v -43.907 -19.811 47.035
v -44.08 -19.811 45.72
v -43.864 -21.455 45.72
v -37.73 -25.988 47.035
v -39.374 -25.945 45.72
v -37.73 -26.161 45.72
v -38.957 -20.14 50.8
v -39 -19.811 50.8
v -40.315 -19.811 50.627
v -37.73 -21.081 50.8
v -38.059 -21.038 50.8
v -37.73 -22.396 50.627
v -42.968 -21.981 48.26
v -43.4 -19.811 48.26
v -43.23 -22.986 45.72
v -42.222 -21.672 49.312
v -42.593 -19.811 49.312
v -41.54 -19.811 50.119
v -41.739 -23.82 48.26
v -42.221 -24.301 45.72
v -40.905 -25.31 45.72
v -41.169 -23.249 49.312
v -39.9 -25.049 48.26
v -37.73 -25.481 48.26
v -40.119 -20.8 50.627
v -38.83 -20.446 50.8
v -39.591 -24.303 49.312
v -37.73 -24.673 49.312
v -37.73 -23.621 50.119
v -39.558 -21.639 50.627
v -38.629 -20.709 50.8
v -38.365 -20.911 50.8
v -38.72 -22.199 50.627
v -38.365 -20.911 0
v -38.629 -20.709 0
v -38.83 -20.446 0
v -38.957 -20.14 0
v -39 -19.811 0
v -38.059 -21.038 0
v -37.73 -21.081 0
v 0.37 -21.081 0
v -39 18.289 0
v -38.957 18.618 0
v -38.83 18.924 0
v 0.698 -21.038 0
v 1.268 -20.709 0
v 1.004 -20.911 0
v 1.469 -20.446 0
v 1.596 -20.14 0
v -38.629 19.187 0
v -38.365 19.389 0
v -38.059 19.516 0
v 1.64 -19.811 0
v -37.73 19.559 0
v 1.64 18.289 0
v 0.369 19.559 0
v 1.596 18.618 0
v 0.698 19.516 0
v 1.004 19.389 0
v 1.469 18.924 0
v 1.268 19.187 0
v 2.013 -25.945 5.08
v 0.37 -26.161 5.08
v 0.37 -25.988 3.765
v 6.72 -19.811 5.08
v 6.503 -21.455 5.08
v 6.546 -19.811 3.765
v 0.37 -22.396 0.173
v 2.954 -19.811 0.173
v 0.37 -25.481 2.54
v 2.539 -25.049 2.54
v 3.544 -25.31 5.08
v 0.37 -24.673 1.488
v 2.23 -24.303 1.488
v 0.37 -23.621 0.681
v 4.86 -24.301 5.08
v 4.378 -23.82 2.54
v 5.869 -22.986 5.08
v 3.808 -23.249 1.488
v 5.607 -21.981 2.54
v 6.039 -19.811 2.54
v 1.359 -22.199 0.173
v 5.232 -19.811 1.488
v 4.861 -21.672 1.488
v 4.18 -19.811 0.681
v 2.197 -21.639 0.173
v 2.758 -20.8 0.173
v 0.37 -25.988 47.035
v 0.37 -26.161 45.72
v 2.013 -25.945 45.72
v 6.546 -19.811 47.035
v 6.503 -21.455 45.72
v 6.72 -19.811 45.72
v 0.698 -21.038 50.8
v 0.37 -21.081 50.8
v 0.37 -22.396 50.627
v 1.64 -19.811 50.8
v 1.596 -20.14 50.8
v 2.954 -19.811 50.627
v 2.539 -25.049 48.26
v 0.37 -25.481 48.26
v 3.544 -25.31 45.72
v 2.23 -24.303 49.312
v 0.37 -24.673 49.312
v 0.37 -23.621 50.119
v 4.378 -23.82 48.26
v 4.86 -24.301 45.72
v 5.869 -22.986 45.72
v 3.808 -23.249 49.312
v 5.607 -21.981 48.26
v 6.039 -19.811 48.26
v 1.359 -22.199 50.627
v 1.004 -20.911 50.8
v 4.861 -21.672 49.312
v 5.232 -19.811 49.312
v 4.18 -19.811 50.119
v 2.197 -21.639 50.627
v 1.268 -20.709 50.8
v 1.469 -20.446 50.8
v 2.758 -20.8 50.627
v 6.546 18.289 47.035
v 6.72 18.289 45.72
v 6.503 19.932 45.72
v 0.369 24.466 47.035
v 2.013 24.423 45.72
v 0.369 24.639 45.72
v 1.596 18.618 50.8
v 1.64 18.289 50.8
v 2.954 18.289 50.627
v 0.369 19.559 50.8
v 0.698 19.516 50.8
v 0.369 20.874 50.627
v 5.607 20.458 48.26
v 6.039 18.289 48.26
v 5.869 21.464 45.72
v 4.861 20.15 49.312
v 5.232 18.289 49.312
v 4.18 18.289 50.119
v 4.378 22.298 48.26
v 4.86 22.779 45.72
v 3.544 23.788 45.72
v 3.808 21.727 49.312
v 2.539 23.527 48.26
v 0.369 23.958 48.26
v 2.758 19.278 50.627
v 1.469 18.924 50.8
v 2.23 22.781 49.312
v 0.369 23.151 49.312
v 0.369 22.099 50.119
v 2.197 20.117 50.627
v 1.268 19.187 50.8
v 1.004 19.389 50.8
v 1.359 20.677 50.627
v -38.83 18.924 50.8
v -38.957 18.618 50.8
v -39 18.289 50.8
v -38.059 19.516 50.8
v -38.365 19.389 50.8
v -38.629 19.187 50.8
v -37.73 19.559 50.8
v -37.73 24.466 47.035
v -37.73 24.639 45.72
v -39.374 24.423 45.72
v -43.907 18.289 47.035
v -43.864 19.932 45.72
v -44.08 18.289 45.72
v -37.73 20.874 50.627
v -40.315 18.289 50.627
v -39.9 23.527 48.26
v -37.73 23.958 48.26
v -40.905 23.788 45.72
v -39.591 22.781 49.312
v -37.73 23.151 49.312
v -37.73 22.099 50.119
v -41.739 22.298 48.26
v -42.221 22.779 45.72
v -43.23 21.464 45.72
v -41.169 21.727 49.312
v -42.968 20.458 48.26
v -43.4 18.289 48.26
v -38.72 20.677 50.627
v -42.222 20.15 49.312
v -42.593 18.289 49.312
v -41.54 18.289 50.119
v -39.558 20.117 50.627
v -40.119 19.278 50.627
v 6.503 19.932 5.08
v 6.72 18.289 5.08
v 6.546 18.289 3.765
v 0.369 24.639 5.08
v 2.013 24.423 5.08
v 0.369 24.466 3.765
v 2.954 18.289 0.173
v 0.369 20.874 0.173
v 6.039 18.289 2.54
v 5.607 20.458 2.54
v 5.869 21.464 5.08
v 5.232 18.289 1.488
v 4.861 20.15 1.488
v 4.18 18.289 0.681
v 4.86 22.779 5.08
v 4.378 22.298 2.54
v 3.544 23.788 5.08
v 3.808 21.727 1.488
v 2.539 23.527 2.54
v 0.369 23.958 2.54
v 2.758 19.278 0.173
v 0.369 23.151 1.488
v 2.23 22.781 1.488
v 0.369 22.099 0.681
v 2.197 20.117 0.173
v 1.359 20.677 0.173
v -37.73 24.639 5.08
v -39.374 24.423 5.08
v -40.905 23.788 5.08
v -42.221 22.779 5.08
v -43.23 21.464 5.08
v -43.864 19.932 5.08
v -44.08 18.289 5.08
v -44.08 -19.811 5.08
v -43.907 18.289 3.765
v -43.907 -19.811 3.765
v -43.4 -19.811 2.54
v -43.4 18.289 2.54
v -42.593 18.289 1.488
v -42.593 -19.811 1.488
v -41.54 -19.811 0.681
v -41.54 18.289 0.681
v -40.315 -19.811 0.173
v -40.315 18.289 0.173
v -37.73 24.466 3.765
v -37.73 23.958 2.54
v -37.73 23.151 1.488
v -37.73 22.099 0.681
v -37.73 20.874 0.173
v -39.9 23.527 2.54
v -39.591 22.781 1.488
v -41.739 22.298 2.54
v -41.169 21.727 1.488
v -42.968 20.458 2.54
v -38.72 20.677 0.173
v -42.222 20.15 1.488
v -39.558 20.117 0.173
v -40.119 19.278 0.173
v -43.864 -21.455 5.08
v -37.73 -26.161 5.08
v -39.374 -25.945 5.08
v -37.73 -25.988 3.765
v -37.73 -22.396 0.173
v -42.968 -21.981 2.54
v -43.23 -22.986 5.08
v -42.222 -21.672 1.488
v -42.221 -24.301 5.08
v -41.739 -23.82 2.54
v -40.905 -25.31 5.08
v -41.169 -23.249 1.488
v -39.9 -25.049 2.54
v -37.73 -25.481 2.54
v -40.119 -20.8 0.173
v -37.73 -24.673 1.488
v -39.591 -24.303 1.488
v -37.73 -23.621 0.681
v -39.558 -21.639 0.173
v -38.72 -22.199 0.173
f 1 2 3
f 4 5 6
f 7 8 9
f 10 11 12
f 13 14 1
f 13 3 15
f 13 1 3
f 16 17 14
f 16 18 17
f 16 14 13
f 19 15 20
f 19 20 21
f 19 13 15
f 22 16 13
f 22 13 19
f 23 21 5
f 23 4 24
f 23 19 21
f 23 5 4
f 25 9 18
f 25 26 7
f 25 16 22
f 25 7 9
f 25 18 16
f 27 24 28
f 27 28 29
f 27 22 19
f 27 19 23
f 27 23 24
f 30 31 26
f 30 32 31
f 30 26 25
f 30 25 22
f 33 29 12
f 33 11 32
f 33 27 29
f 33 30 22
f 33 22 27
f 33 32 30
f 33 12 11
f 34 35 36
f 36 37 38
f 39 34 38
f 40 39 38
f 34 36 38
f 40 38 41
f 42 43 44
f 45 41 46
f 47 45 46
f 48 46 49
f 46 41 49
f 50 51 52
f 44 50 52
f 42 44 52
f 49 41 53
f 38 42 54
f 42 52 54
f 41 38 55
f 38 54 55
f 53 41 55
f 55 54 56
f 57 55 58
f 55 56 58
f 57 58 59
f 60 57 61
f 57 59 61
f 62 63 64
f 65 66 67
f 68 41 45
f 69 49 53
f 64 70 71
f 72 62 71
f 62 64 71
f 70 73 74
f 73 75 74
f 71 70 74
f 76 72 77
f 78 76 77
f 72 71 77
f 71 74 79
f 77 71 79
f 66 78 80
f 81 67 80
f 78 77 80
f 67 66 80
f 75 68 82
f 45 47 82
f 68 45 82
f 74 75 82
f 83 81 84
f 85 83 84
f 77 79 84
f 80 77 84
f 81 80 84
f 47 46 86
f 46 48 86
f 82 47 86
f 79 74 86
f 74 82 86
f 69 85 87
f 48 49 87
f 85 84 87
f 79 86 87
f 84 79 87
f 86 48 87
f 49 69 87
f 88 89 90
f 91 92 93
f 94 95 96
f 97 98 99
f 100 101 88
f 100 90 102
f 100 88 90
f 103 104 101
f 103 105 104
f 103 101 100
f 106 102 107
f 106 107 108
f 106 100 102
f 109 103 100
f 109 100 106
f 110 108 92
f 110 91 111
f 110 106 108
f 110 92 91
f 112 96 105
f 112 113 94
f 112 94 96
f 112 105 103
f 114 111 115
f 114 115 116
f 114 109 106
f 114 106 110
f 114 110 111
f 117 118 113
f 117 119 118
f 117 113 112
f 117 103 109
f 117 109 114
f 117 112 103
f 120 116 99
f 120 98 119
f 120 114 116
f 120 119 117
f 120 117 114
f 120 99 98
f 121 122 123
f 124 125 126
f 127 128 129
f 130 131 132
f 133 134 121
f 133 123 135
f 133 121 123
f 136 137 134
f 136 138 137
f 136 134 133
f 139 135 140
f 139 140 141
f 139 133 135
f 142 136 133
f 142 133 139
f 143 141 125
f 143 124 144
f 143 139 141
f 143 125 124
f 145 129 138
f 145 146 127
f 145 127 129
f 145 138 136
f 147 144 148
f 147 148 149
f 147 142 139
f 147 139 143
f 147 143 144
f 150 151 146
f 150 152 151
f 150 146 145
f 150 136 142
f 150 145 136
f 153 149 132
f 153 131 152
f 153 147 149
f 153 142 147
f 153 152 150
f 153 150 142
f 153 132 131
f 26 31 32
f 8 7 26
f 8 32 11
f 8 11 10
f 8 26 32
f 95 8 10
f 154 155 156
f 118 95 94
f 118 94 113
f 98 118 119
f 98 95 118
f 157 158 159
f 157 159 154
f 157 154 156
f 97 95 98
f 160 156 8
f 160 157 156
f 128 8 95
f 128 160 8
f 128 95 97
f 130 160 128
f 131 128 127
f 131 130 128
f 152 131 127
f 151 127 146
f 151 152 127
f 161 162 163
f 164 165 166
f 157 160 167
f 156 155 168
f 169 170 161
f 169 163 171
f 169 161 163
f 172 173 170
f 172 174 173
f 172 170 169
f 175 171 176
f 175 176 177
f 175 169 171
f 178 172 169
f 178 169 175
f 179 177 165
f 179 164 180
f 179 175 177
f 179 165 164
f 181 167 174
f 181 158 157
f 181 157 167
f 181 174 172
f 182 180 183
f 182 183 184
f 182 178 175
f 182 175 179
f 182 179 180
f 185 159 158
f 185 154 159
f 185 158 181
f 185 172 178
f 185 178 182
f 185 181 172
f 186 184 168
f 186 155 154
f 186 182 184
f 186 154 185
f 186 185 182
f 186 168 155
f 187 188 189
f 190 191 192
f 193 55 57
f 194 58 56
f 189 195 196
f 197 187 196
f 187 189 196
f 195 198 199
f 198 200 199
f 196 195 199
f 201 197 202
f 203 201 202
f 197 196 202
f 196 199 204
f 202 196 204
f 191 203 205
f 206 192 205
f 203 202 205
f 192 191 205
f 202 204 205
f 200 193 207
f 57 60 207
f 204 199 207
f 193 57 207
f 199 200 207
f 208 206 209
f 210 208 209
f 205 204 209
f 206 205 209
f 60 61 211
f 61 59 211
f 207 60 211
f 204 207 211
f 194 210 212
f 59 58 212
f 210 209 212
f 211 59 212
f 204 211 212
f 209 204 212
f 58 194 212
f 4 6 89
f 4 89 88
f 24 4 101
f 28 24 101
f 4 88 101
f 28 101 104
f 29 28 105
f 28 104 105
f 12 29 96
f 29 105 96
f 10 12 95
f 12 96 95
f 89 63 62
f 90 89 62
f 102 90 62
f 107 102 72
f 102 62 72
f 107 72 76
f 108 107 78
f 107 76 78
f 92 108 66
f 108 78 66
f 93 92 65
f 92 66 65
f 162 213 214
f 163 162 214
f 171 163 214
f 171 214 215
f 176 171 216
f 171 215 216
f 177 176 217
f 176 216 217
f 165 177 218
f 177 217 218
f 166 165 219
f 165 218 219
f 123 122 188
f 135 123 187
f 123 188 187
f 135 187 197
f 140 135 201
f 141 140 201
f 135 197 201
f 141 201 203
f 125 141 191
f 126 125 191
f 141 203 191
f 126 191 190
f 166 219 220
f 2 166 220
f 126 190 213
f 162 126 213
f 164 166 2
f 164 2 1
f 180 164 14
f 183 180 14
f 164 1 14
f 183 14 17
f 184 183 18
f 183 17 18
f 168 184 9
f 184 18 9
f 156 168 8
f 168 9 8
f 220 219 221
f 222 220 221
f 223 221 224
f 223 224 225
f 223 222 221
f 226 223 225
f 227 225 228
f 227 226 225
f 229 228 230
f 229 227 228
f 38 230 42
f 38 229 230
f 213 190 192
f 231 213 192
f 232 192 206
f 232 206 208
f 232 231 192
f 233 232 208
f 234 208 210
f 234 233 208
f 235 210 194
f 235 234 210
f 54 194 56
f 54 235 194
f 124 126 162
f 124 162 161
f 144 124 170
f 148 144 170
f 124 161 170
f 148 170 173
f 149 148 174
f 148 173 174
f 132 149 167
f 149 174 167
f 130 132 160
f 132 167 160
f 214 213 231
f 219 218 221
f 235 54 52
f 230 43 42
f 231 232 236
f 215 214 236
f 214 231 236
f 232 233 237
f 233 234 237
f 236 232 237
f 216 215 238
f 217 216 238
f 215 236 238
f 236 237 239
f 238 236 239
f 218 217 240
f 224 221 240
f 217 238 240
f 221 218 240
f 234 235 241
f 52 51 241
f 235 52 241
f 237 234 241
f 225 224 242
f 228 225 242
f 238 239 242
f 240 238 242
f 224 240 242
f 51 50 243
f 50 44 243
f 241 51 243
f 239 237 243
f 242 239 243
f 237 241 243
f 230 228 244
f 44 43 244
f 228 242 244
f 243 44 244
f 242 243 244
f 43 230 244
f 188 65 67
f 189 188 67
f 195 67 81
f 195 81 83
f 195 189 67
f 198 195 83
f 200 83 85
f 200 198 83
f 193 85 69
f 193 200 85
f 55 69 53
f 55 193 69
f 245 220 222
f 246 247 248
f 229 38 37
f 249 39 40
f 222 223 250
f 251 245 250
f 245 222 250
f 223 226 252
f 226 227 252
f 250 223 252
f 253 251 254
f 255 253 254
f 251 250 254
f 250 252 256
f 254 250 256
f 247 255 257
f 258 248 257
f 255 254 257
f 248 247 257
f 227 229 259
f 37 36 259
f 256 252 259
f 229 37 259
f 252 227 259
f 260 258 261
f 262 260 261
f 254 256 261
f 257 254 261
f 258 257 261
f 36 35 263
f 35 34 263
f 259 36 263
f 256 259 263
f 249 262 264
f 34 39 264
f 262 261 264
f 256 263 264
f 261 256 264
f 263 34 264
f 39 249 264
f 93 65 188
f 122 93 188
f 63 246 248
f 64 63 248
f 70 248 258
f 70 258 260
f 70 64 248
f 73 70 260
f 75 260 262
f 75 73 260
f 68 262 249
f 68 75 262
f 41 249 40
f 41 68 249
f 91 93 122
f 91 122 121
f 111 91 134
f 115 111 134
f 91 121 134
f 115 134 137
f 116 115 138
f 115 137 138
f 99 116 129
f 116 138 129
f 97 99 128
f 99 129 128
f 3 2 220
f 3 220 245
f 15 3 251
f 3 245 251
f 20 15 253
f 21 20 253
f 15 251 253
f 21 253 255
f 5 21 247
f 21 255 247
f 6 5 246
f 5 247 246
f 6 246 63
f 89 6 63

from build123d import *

# Parameters (mm, degrees)
F1_DEPTH = 50.8
F2_R     = 5.08


with BuildPart() as f1:
    # F0 (on Top) → F1 (new body)
    with BuildSketch(Plane.XY):
        with BuildLine():
            Line((0.3695, 24.638906), (-37.7305, 24.638906))
            ThreePointArc((-37.7305, 24.638906), (-42.220628, 22.779034), (-44.0805, 18.288906))
            Line((-44.0805, 18.288906), (-44.0805, -19.811094))
            ThreePointArc((-44.0805, -19.811094), (-42.220628, -24.301222), (-37.7305, -26.161094))
            Line((-37.7305, -26.161094), (0.3695, -26.161094))
            ThreePointArc((0.3695, -26.161094), (4.859628, -24.301222), (6.7195, -19.811094))
            Line((6.7195, -19.811094), (6.7195, 18.288906))
            ThreePointArc((6.7195, 18.288906), (4.859628, 22.779034), (0.3695, 24.638906))
        make_face()
    extrude(amount=F1_DEPTH)

    # F2
    f2_edges = [f1.edges().sort_by_distance(p)[0] for p in [
        (-18.6805, -26.161094, 50.8),
        (-18.6805, -26.161094, 0),
    ]]
    fillet(f2_edges, radius=F2_R)


solid = f1.part
